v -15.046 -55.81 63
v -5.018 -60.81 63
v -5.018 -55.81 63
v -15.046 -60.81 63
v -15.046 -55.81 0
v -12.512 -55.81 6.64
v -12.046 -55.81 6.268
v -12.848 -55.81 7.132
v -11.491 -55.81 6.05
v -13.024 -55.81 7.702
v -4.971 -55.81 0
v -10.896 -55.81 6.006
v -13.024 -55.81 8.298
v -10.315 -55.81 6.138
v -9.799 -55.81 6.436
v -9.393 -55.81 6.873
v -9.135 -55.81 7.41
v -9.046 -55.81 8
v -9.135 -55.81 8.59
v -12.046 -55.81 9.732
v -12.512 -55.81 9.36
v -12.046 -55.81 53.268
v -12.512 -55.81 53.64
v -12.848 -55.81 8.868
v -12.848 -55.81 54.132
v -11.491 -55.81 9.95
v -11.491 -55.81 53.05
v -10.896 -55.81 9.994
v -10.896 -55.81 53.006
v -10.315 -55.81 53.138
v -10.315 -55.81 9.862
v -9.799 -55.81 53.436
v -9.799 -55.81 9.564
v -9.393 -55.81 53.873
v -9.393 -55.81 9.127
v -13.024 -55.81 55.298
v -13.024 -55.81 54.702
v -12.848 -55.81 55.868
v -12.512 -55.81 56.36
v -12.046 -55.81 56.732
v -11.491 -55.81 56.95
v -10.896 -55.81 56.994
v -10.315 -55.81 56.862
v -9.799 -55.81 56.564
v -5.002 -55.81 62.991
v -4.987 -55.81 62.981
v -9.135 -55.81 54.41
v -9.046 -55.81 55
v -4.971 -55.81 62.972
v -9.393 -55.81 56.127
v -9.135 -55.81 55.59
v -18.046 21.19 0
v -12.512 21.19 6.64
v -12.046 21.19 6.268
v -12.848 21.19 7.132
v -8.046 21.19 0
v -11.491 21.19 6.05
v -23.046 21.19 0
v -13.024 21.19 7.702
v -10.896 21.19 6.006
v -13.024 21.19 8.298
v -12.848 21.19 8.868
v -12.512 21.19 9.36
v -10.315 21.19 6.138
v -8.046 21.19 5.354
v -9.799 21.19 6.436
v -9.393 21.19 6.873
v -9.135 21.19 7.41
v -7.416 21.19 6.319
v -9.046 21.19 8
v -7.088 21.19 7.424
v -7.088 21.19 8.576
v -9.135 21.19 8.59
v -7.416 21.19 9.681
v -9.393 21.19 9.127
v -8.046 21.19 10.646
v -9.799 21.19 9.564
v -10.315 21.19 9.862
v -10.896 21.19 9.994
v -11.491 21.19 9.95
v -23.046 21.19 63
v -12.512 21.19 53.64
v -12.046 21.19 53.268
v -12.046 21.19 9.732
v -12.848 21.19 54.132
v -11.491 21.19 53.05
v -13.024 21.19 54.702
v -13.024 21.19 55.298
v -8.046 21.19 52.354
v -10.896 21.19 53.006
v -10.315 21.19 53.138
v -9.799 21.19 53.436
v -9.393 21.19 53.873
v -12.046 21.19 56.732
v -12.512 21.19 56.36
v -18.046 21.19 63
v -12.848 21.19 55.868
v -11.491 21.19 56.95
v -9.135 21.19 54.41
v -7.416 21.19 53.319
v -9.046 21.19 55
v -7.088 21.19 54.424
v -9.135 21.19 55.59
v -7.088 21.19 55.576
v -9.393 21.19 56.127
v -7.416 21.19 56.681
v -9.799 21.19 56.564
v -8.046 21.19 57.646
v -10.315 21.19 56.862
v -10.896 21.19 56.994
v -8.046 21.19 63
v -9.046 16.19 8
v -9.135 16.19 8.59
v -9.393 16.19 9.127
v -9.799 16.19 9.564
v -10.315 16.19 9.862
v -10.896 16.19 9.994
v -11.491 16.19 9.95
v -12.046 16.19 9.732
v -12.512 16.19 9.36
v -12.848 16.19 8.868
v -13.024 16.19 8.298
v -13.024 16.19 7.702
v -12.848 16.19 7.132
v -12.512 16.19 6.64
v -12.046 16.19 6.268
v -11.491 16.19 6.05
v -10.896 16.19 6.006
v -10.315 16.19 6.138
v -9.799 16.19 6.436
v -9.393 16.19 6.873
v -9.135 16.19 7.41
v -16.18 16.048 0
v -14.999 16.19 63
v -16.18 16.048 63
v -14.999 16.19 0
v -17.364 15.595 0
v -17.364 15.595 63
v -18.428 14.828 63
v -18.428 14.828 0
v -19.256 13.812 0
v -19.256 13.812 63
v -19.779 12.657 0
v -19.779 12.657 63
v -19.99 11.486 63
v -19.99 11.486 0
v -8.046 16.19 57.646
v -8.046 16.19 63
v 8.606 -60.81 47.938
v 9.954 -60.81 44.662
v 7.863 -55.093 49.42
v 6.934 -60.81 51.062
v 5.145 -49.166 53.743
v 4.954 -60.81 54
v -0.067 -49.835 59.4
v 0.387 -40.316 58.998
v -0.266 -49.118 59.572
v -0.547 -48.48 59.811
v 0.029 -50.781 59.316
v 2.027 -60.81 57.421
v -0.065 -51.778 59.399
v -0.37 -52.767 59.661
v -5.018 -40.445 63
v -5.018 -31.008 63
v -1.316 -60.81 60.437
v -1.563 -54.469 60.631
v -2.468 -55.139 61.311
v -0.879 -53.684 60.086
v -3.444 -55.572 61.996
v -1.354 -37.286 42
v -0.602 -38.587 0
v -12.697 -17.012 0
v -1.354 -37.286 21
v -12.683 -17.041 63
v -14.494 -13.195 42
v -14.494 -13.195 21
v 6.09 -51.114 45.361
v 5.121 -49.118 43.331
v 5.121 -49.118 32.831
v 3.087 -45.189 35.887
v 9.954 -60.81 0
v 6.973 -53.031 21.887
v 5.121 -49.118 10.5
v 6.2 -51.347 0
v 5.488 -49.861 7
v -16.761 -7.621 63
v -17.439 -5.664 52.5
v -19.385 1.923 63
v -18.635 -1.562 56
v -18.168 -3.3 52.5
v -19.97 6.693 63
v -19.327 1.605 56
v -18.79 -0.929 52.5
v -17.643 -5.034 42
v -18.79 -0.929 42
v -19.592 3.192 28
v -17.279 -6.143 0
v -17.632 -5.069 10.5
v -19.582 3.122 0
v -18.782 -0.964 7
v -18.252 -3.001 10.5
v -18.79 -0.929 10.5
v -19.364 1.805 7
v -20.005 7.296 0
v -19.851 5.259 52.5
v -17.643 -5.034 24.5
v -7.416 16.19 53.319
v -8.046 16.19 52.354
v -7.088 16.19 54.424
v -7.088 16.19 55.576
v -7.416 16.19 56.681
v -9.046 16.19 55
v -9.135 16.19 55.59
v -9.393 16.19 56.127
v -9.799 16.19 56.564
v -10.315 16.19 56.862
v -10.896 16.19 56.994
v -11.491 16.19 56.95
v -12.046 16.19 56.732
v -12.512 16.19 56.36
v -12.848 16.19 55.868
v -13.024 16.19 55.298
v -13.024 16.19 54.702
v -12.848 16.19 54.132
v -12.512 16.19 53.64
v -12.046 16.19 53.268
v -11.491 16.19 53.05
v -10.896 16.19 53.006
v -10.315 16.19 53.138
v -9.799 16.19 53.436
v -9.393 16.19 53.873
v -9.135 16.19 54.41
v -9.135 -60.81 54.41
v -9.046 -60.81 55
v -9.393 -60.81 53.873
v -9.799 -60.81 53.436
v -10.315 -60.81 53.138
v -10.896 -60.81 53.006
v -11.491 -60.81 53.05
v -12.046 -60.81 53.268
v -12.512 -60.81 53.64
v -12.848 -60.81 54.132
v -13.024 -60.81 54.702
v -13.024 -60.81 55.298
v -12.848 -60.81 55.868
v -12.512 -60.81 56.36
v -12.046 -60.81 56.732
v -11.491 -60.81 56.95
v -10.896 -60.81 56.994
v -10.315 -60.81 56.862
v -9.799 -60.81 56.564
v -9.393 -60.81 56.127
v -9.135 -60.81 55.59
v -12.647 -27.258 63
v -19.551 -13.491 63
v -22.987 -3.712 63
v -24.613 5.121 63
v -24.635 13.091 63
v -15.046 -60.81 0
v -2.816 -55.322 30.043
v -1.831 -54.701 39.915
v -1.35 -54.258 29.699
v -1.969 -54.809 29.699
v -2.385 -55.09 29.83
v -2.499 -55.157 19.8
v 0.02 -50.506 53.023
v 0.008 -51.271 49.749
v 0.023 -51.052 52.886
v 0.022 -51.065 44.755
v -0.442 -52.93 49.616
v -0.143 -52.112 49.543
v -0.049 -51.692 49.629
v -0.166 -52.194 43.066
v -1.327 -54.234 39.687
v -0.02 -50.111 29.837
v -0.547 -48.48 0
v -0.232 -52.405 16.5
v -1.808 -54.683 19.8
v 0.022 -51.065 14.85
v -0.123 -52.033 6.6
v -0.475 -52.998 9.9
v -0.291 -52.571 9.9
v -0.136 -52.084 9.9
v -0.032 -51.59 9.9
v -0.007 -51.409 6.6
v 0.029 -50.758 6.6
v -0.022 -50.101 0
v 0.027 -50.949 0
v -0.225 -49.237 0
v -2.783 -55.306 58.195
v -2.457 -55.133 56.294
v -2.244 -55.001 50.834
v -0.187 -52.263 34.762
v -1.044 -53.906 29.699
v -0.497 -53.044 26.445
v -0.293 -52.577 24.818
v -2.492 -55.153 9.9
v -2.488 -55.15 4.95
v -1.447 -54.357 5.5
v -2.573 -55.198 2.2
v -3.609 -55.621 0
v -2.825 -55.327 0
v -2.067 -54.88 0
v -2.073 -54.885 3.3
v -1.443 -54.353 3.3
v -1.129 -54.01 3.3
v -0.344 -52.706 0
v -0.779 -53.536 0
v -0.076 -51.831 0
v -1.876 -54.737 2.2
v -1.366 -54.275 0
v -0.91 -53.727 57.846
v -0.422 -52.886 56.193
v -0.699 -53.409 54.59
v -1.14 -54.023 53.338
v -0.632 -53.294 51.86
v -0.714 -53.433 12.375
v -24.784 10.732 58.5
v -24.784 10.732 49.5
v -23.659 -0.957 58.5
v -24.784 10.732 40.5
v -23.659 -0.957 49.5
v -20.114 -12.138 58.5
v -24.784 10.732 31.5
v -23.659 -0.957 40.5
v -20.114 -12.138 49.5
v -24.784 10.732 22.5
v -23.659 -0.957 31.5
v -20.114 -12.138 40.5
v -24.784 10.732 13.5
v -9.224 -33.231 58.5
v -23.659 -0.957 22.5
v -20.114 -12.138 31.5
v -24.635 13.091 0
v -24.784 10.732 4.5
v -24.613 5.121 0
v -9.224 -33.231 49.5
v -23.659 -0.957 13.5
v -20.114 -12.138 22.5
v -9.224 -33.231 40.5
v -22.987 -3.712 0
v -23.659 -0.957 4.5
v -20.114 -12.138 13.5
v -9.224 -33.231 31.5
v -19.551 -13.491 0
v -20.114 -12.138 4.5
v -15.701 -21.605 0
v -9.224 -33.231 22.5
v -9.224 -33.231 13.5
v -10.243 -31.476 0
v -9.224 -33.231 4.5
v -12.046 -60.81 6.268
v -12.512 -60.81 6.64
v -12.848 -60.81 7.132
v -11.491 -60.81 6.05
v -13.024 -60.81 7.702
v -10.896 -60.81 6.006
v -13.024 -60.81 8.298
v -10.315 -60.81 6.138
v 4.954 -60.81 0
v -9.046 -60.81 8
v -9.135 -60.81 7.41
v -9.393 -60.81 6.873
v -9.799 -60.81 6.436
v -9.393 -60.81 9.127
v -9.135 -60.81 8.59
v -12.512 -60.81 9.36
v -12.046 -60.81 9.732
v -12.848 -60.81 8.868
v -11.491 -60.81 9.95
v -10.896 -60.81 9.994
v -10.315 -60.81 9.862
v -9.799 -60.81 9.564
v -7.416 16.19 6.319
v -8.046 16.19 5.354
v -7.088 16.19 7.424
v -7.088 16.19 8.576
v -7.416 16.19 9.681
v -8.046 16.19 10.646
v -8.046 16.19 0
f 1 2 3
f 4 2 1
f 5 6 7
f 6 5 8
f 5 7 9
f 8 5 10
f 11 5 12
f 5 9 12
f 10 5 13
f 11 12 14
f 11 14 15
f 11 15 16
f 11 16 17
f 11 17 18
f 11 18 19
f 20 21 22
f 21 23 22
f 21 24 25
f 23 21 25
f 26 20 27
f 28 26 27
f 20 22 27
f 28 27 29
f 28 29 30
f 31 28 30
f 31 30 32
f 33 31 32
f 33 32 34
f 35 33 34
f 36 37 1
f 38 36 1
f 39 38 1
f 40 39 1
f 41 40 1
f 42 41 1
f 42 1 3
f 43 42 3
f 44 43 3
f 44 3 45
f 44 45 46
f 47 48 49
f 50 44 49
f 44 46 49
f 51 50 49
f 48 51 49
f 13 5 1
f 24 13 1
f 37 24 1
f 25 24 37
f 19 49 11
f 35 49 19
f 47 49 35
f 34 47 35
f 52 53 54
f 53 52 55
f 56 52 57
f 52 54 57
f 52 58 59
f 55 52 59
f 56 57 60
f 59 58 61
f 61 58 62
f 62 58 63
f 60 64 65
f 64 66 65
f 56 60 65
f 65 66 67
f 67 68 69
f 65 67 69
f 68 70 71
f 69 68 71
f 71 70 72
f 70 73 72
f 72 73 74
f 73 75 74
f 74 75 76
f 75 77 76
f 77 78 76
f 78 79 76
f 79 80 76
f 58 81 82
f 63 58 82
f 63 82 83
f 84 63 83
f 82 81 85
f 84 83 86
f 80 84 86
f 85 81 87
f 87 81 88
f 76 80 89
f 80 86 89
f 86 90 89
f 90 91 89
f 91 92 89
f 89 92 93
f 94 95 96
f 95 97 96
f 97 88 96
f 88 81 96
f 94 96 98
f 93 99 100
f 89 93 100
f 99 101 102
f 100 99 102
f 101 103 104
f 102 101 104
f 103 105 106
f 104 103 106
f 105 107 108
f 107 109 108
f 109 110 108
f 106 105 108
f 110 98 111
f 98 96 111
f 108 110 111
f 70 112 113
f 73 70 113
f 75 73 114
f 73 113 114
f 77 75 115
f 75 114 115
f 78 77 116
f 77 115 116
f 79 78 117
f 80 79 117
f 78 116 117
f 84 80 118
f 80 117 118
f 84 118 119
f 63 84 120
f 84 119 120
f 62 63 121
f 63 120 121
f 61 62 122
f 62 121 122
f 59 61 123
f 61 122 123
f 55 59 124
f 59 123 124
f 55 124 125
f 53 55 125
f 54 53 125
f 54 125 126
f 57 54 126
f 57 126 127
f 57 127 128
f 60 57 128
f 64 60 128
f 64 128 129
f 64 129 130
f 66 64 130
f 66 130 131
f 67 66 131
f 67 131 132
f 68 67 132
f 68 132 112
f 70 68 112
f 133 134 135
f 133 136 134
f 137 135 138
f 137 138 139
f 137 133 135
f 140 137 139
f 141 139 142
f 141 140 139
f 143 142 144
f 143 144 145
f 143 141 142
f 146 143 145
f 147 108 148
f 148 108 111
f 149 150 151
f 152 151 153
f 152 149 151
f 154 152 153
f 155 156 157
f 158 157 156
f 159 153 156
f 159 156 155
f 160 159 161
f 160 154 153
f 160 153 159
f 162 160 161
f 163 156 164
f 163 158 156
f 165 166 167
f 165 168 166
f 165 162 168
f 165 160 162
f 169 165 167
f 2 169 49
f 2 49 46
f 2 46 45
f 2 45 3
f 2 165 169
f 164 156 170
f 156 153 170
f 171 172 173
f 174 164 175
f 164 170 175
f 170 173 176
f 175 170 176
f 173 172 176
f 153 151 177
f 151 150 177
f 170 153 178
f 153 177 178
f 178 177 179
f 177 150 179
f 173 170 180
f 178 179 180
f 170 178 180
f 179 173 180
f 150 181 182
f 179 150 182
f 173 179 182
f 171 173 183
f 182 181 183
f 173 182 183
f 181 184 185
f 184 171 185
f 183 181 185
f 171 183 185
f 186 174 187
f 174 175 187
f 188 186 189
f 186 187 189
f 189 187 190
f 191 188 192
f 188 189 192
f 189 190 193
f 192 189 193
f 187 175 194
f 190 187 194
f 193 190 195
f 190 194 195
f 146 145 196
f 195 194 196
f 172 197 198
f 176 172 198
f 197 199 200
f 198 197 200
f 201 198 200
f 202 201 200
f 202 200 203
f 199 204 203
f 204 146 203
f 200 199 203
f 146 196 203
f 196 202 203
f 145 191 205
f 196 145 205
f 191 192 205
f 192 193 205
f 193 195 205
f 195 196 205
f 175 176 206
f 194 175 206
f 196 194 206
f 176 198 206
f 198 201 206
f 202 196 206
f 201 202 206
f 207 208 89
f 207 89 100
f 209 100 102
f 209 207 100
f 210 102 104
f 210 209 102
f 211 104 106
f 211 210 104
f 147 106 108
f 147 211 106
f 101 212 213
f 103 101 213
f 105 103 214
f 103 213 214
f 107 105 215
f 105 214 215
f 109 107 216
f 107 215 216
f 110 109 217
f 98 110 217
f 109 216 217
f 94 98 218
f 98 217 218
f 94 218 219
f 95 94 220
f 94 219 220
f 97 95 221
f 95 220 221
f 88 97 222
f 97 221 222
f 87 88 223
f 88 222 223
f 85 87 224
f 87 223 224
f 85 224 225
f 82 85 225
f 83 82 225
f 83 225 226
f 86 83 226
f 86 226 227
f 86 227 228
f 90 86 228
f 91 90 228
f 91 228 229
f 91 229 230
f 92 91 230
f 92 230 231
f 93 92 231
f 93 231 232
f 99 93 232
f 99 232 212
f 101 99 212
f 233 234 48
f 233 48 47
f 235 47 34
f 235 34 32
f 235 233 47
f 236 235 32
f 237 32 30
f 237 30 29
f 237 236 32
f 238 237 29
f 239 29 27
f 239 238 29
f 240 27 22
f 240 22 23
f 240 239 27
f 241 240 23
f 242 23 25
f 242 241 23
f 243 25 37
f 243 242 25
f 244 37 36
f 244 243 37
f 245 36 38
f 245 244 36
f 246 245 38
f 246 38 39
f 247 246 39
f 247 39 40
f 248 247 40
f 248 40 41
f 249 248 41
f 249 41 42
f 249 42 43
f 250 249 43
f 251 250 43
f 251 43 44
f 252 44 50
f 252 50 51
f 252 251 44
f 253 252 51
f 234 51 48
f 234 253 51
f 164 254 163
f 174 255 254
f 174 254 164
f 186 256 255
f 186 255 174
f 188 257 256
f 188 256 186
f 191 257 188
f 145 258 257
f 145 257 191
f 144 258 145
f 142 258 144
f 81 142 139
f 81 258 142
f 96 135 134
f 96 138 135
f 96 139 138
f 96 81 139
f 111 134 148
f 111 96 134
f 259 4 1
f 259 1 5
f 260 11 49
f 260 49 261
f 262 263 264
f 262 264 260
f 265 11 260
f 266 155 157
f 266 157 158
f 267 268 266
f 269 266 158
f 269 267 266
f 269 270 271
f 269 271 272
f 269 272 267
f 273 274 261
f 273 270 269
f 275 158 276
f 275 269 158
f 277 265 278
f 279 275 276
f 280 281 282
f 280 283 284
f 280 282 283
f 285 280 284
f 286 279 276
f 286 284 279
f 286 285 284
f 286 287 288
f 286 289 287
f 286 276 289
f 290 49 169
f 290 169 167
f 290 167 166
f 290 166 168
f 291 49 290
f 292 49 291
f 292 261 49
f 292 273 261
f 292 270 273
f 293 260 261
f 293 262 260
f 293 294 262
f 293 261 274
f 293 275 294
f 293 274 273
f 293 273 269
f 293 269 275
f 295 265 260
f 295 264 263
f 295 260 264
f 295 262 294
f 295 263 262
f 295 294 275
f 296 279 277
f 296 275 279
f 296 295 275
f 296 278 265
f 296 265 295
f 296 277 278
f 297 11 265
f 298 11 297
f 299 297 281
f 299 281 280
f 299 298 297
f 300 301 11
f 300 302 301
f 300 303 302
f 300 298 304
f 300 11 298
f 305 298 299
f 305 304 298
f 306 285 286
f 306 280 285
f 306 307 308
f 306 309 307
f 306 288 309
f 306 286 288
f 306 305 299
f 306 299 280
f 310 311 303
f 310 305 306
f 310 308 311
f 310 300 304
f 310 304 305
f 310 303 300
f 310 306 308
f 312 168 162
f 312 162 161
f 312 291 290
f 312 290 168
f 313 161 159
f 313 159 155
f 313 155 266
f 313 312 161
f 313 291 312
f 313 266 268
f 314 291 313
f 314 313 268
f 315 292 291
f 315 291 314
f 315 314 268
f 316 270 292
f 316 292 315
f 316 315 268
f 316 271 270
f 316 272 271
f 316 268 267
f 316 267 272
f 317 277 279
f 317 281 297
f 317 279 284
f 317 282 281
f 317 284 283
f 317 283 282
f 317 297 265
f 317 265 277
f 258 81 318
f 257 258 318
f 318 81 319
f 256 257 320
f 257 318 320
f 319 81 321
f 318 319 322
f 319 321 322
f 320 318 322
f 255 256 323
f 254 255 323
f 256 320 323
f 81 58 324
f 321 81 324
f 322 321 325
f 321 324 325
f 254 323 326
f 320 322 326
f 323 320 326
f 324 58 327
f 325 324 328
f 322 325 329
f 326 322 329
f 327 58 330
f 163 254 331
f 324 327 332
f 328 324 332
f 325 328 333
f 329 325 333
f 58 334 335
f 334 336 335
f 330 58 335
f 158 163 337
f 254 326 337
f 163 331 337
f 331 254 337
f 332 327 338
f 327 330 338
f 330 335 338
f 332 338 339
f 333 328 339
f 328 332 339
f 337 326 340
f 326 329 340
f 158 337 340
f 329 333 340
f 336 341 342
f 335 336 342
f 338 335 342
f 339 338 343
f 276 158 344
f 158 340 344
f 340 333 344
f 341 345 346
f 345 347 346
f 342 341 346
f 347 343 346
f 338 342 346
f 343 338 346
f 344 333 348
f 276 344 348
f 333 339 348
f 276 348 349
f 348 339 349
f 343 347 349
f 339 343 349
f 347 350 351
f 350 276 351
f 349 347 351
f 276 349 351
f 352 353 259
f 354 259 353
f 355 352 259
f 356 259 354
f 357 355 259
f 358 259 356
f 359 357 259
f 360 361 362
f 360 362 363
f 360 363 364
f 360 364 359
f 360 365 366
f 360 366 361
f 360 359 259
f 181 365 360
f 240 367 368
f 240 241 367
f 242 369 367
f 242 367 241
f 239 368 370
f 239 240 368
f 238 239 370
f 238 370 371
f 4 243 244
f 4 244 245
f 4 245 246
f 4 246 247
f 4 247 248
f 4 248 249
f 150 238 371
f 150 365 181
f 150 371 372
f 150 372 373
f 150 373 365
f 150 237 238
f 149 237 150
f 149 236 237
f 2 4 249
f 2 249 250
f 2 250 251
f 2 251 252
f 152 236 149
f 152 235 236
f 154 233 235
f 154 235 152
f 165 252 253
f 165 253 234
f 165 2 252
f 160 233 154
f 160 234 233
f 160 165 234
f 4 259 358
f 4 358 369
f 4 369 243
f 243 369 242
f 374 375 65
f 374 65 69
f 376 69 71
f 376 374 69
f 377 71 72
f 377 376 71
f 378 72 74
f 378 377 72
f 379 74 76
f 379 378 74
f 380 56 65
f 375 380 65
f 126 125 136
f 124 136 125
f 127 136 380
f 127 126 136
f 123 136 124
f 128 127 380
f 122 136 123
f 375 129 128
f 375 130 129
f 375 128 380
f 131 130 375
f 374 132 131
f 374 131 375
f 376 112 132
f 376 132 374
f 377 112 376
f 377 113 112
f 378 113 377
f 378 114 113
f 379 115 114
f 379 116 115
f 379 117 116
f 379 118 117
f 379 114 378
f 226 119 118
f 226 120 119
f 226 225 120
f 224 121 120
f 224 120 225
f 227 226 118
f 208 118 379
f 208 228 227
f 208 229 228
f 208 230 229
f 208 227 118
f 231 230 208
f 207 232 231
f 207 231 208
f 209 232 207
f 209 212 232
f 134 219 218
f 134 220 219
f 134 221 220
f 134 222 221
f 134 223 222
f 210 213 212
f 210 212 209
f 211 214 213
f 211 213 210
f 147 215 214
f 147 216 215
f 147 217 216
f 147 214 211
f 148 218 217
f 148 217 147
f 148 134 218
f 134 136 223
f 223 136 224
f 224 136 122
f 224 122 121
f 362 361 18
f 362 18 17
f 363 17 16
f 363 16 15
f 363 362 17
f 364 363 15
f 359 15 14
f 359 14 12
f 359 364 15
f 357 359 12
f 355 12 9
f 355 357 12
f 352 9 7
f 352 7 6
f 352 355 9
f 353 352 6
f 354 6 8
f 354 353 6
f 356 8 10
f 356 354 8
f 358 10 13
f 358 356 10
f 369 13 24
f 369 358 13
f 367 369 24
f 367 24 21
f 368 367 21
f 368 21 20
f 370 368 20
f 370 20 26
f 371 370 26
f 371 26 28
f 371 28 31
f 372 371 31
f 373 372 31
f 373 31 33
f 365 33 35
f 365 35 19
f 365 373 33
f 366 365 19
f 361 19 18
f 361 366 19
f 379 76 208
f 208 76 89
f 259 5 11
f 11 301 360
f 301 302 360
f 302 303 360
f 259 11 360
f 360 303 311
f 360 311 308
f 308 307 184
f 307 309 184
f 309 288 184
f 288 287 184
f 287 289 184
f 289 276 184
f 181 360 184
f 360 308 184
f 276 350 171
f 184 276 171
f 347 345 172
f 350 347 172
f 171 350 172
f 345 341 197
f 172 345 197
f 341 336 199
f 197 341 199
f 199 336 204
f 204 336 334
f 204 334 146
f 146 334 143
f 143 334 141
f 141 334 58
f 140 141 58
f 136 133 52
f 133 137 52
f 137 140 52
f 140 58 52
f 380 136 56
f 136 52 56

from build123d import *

# Parameters (mm, degrees)
BOSS_EXTRUDE1_DEPTH = 63
CUT_EXTRUDE4_DEPTH  = 60
BOSS_EXTRUDE5_DEPTH = 5
FILLET3_R           = 5
BOSS_EXTRUDE6_DEPTH = 5
BOSS_EXTRUDE7_DEPTH = 63
FILLET4_R           = 5
SKETCH14_R          = 1.9999999999999996
SKETCH14_R_2        = 2
CUT_EXTRUDE5_DEPTH  = 10
SKETCH15_R          = 4.000000000000002
SKETCH15_R_2        = 2
SKETCH15_R_3        = 4.000000000000001
SKETCH15_R_4        = 1.9999999999999996
BOSS_EXTRUDE8_DEPTH = 5
CUT_EXTRUDE6_START  = -5
SKETCH16_R          = 2
SKETCH16_R_2        = 1.9999999999999996
CUT_EXTRUDE6_DEPTH  = 5


# Read off the part's stored shape, not the designer's step: Boss-Extrude1
with BuildPart() as part:
    # Boss-Extrude1 outline → Boss-Extrude1 (new body)
    with BuildSketch(Plane.XY):
        with BuildLine():
            Line((4.954113003, -60.810475982), (9.954113003, -60.810475982))
            add(Edge.make_bspline(
                [(9.954113003, -60.810475982), (1.78782004145555, -34.5665002552168), (-27.9913048539535, -7.28206006884536), (-18.045886997, 21.189524018)],
                knots=[0, 0, 0, 0, 1, 1, 1, 1], degree=3))
            Line((-18.045886997, 21.189524018), (-23.045886997, 21.189524018))
            add(Edge.make_bspline(
                [(-23.045886997, 21.189524018), (-23.192896954450642, 20.707388183877445), (-23.619107908159766, 19.212032019757164), (-24.3984566732412, 15.7227335791878), (-24.9259424602794, 10.7154717202631), (-24.7059244457818, 4.80639957244901), (-23.4437954980132, -2.90791828688786), (-20.3649701079, -12.2138739410152), (-15.1627192062184, -22.9267758821705), (-9.22446854976525, -33.2839412268649), (-4.2731817504284, -41.6523064711653), (-0.670405229165687, -48.1782991582584), (1.76514247549924, -52.980809675903), (3.49961876568494, -56.8892897902748), (4.492016037450547, -59.4867262662843), (4.856824135774904, -60.5259563871115), (4.954113003, -60.810475982)],
                knots=[0.01630237867055594, 0.01630237867055594, 0.01630237867055594, 0.01630237867055594, 0.03125, 0.0625, 0.125, 0.1875, 0.25, 0.375, 0.5, 0.625, 0.75, 0.8125, 0.875, 0.9375, 0.96875, 0.9805431413660037, 0.9805431413660037, 0.9805431413660037, 0.9805431413660037], degree=3))
        make_face()
    extrude(amount=BOSS_EXTRUDE1_DEPTH)

    # Sketch10 → Cut-Extrude4 (cut)
    with BuildSketch(Plane.XZ.offset(60.81047598214444)):
        with BuildLine():
            Line((9.954113003304059, 63), (9.954113003304059, 44.66190378968828))
            ThreePointArc((9.954113003304059, 44.66190378968828), (4.065539070195477, 55.13527900478137), (-5.018130619372688, 63))
            Line((-5.018130619372688, 63), (4.954113003304057, 63))
            Line((4.954113003304057, 63), (9.954113003304059, 63))
        make_face()
    extrude(amount=-CUT_EXTRUDE4_DEPTH, mode=Mode.SUBTRACT)

    # Sketch11 → Boss-Extrude5 (add)
    with BuildSketch(Plane.XZ.offset(60.81047598214444)):
        with BuildLine():
            Line((-15.045886996695936, 6e-16), (4.954113003304057, 0))
            Line((4.954113003304057, 0), (4.954113003304058, 54.00000000000057))
            ThreePointArc((4.954113003304058, 54.00000000000057), (0.4038163976446967, 58.98290612532635), (-5.018130619372695, 63))
            Line((-5.018130619372695, 63), (-15.045886996695936, 63))
            Line((-15.045886996695936, 63), (-15.045886996695936, 6e-16))
        make_face()
    extrude(amount=-BOSS_EXTRUDE5_DEPTH)

    # Fillet3
    fillet3_edges = [part.edges().sort_by_distance(p)[0] for p in [
        (3.003762593217399, -55.81047598214444, 28.187768789799662),
    ]]
    fillet(fillet3_edges, radius=FILLET3_R)



with BuildPart() as body_2:
    # Sketch12 → Boss-Extrude6 (new body)
    with BuildSketch(Plane(origin=(0, 21.189524017855575, 0), x_dir=(1, 0, 0), z_dir=(0, 1, 0))):
        Polygon((-18.04588699669594, -63), (-18.04588699669594, 0), (-8.045886996695941, -3.31e-15), (-8.045886996695941, -63), align=None)
    extrude(amount=-BOSS_EXTRUDE6_DEPTH)


with BuildPart() as part_1:
    add(part.part)

    add(body_2.part)  # Boss-Extrude7 merges body 2
    # Sketch13 → Boss-Extrude7 (add)
    with BuildSketch(Plane.XY.offset(63)):
        with BuildLine():
            Line((-18.04588699669594, 16.189524017855575), (-18.04588699669594, 21.189524017855575))
            add(Edge.make_bspline(
                [(-19.398734896011995, 16.18952401785558), (-19.076313221090718, 17.852122543862073), (-18.62949534090365, 19.51877933077492), (-18.04588699669594, 21.189524017855575)],
                knots=[0.9413188714055053, 0.9413188714055053, 0.9413188714055053, 0.9413188714055053, 1, 1, 1, 1], degree=3))
            Line((-19.398734896011995, 16.18952401785558), (-18.04588699669594, 16.189524017855575))
        make_face()
    extrude(amount=-BOSS_EXTRUDE7_DEPTH)

    # Fillet4
    fillet4_edges = [part_1.edges().sort_by_distance(p)[0] for p in [
        (-19.398734896011995, 16.18952401785558, 31.5),
    ]]
    fillet(fillet4_edges, radius=FILLET4_R)

    # Sketch14 → Cut-Extrude5 (cut)
    with BuildSketch(Plane.XZ.offset(-16.18952401785553)):
        with Locations((-11.045886996695984, 8)):
            Circle(SKETCH14_R)
        with Locations((-11.045886996695984, 55)):
            Circle(SKETCH14_R_2)
    extrude(amount=-CUT_EXTRUDE5_DEPTH, mode=Mode.SUBTRACT)

    # Sketch15 → Boss-Extrude8 (add)
    # profile 1 of 2: a face of its own
    with BuildSketch(Plane.XZ.offset(-16.18952401785553)):
        with Locations((-11.045886996695982, 55)):
            Circle(SKETCH15_R)
        with Locations((-11.045886996695982, 55)):
            Circle(SKETCH15_R_2, mode=Mode.SUBTRACT)
    # profile 2 of 2: a face of its own
    with BuildSketch(Plane.XZ.offset(-16.18952401785553)):
        with Locations((-11.045886996695982, 8)):
            Circle(SKETCH15_R_3)
        with Locations((-11.045886996695982, 8)):
            Circle(SKETCH15_R_4, mode=Mode.SUBTRACT)
    extrude(amount=-BOSS_EXTRUDE8_DEPTH)

    # Sketch16 → Cut-Extrude6 (cut)
    with BuildSketch(Plane(origin=(0, -55.81047598214444, 0), x_dir=(1, 0, 0), z_dir=(0, 1, 0)).offset(CUT_EXTRUDE6_START)):
        with Locations((-11.045886996695936, -55)):
            Circle(SKETCH16_R)
        with Locations((-11.045886996695936, -8)):
            Circle(SKETCH16_R_2)
    extrude(amount=CUT_EXTRUDE6_DEPTH, mode=Mode.SUBTRACT)


solid = part_1.part
